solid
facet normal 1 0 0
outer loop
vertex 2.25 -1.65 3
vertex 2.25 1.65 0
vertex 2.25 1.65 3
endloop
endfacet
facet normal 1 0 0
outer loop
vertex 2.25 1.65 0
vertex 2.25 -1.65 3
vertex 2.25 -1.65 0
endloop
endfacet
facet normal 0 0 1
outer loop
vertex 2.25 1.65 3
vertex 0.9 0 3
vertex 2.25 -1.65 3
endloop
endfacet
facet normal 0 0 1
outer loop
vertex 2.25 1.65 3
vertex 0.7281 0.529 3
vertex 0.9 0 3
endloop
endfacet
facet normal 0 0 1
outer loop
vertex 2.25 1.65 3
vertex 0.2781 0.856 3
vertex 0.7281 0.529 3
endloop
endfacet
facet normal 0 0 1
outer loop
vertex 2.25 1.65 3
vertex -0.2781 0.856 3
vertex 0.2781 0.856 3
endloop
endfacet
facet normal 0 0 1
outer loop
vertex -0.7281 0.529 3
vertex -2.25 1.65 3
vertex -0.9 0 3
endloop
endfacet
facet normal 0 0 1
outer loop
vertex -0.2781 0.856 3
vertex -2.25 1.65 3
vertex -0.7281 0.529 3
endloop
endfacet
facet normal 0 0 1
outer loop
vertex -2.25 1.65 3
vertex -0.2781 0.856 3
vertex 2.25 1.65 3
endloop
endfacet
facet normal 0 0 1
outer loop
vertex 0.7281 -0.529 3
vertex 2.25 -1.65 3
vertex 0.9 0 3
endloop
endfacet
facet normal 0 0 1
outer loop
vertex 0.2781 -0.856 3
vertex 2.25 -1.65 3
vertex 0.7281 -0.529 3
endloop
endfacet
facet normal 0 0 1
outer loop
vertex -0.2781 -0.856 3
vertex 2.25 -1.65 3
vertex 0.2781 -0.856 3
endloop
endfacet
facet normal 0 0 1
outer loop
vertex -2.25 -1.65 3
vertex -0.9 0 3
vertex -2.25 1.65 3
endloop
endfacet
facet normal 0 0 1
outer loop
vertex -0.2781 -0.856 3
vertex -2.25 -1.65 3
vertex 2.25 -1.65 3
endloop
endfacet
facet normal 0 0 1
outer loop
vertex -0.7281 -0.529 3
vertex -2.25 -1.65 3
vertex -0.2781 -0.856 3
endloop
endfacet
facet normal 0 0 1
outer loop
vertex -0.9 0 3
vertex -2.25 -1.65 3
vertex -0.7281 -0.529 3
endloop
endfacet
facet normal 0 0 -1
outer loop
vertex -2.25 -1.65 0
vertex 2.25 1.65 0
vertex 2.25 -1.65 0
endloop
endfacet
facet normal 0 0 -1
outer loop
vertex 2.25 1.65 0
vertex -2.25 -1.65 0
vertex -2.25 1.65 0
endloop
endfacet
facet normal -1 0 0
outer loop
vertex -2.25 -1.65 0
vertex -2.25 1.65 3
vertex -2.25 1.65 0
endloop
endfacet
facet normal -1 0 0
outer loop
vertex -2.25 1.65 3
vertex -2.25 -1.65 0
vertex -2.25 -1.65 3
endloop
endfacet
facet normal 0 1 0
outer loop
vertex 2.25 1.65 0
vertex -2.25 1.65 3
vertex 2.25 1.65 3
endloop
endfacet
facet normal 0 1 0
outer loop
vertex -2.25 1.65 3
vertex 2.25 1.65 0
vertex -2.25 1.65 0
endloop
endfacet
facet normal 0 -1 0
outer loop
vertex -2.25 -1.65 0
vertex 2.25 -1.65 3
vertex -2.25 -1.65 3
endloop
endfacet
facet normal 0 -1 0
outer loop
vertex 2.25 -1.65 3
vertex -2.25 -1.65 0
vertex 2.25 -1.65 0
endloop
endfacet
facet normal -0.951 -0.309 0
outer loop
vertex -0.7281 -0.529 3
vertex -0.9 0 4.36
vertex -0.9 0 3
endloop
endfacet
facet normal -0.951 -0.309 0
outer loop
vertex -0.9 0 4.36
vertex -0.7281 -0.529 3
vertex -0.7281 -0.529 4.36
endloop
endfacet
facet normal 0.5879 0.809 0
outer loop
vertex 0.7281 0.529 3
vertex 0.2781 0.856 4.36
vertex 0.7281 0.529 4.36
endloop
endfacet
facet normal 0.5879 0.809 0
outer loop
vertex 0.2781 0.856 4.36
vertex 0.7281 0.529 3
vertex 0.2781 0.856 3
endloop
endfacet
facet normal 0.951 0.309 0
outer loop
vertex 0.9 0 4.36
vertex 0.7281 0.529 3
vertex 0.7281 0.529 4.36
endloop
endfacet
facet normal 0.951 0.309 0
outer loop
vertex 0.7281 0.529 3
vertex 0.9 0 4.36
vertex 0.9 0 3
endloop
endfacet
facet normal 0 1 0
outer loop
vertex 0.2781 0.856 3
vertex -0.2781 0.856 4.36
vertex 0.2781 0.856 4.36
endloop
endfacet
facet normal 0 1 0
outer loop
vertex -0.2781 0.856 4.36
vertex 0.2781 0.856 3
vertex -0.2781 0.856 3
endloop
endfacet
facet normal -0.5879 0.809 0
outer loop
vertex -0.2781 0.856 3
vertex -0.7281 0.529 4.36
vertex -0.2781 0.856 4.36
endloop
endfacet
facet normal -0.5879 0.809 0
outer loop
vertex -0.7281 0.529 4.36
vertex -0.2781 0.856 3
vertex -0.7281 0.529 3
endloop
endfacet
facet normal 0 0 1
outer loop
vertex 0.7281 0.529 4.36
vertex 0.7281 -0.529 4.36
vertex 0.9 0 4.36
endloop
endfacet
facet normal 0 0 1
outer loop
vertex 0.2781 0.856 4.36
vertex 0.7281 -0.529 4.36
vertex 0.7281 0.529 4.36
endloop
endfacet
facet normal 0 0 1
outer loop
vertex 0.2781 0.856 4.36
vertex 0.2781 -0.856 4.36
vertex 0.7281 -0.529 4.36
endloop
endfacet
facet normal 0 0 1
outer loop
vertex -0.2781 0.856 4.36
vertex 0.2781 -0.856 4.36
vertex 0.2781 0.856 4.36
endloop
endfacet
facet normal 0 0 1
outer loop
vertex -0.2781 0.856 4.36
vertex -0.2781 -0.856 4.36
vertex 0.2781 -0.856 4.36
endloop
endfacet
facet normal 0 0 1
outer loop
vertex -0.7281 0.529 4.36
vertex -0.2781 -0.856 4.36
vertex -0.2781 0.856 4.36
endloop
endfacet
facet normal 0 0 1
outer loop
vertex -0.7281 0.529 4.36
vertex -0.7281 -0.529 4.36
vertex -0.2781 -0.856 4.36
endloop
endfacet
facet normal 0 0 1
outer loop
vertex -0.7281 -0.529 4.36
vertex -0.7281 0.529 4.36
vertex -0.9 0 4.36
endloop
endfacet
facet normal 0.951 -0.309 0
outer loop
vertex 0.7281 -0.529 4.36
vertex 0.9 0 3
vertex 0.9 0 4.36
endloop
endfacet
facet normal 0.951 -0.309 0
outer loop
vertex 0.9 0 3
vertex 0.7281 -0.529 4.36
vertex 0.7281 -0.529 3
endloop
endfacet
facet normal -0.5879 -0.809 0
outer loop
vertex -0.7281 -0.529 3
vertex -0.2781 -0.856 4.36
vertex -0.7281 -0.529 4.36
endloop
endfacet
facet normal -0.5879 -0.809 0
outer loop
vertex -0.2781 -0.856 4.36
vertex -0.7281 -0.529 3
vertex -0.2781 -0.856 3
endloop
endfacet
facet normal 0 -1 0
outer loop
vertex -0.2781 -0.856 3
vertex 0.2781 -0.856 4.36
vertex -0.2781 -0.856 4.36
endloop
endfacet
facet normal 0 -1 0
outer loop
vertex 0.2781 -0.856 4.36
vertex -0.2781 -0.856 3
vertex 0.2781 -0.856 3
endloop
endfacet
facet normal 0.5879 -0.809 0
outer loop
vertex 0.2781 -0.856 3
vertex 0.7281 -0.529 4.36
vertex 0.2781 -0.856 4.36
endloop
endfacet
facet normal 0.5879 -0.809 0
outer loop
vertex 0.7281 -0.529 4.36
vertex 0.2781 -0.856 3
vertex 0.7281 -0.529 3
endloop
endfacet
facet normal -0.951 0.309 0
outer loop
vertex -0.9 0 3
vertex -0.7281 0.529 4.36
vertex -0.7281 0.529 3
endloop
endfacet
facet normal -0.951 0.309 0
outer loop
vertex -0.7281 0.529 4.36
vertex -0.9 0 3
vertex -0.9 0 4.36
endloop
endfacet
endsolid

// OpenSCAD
/**
  * Module: PCB button placeholder
  *
  * Author: Karim Aziiev <karim.aziiev@gmail.com>
  * License: GPL-3.0-or-later
  */
include <../../colors.scad>
include <../../parameters.scad>
include <../presets.scad>

use <../../lib/functions.scad>
use <../../lib/plist.scad>
use <../../lib/shapes3d.scad>
use <../../lib/transforms.scad>

/**
  ─────────────────────────────────────────────────────────────────────────────
  pcb_button_size_from_plist
  ─────────────────────────────────────────────────────────────────────────────
  Return the oriented nominal body size of a PCB button.

  **Parameters:**
  - `plist`: Button properties; omitted size defaults to `[4.5, 3.3, 3]`.
  - `orientation`: Optional override of the plist orientation, default `"wlh"`.
  **Returns:** Oriented `[width, length, height]` used for body anchoring.

  The projecting button is excluded from the reference box.
 */
function pcb_button_size_from_plist(plist=pcb_button_plist, orientation) =
  assert(plist_is(plist) && len(plist) > 0, "Supply a hardware specification")
  let (size = plist_get("size", plist, [4.5, 3.3, 3]),
       orientation = with_default(orientation,
                                  plist_get("orientation", plist, "wlh")))
  orientation_size(orientation, size);

/**
  ─────────────────────────────────────────────────────────────────────────────
  pcb_button
  ─────────────────────────────────────────────────────────────────────────────
  Create a rectangular switch body with a projecting round button.

  **Parameters:**
  - `size`: Nominal body `[width, length, height]` before orientation.
  - `button_h`: Projection of the button above the canonical body top.
  - `button_d`: Button diameter.
  - `color`: Body color; `undef` uses matte black.
  - `button_color`: Button color; `undef` uses metallic yellow silver.
  - `orientation`: Axis convention for the body, default `"wlh"`.
  - `anchor`: Placement against the oriented body box; default `[0, 0, 1]`.

  The projecting button is excluded from the anchoring reference size.
 */
module pcb_button(size=[4.5, 3.3, 3],
                  button_h=1.36,
                  button_d=1.8,
                  color=matte_black,
                  button_color=metallic_yellow_silver,
                  orientation="wlh",
                  anchor=[0, 0, 1]) {

  with_orientation(from="wlh", to=orientation, anchor=anchor, size=size) {
    color(with_default(color, matte_black), alpha=1) {
      cuboid(size=size);
    }
    translate([0, 0, size[2]]) {
      color(with_default(button_color, metallic_yellow_silver), alpha=1) {
        cyl(d=button_d, h=button_h, $fn=10);
      }
    }
  }
}

/**
  ─────────────────────────────────────────────────────────────────────────────
  pcb_button_from_plist
  ─────────────────────────────────────────────────────────────────────────────
  Render a PCB button from its property list.

  **Parameters:**
  - `plist`: `pcb_button` properties; missing keys use its module defaults.
  - `orientation`: Optional override of the plist orientation, default `"wlh"`.
  - `anchor`: Optional override of the plist anchor, default `[0, 0, 1]`.

  Anchoring uses the nominal body box, excluding the projecting button.
 */
module pcb_button_from_plist(plist=pcb_button_plist, orientation, anchor) {
  assert(plist_is(plist) && len(plist) > 0, "Supply a hardware specification");
  size = plist_get("size", plist, [4.5, 3.3, 3]);
  button_h = plist_get("button_h", plist, 1.36);
  button_d = plist_get("button_d", plist, 1.8);
  color = plist_get("color", plist, matte_black);
  button_color = plist_get("button_color", plist, metallic_yellow_silver);
  orientation = with_default(orientation,
                             plist_get("orientation", plist, "wlh"));
  anchor = with_default(anchor, plist_get("anchor", plist, [0, 0, 1]));
  pcb_button(size=size,
             button_h=button_h,
             button_d=button_d,
             color=color,
             button_color=button_color,
             orientation=orientation,
             anchor=anchor);
}

pcb_button();
